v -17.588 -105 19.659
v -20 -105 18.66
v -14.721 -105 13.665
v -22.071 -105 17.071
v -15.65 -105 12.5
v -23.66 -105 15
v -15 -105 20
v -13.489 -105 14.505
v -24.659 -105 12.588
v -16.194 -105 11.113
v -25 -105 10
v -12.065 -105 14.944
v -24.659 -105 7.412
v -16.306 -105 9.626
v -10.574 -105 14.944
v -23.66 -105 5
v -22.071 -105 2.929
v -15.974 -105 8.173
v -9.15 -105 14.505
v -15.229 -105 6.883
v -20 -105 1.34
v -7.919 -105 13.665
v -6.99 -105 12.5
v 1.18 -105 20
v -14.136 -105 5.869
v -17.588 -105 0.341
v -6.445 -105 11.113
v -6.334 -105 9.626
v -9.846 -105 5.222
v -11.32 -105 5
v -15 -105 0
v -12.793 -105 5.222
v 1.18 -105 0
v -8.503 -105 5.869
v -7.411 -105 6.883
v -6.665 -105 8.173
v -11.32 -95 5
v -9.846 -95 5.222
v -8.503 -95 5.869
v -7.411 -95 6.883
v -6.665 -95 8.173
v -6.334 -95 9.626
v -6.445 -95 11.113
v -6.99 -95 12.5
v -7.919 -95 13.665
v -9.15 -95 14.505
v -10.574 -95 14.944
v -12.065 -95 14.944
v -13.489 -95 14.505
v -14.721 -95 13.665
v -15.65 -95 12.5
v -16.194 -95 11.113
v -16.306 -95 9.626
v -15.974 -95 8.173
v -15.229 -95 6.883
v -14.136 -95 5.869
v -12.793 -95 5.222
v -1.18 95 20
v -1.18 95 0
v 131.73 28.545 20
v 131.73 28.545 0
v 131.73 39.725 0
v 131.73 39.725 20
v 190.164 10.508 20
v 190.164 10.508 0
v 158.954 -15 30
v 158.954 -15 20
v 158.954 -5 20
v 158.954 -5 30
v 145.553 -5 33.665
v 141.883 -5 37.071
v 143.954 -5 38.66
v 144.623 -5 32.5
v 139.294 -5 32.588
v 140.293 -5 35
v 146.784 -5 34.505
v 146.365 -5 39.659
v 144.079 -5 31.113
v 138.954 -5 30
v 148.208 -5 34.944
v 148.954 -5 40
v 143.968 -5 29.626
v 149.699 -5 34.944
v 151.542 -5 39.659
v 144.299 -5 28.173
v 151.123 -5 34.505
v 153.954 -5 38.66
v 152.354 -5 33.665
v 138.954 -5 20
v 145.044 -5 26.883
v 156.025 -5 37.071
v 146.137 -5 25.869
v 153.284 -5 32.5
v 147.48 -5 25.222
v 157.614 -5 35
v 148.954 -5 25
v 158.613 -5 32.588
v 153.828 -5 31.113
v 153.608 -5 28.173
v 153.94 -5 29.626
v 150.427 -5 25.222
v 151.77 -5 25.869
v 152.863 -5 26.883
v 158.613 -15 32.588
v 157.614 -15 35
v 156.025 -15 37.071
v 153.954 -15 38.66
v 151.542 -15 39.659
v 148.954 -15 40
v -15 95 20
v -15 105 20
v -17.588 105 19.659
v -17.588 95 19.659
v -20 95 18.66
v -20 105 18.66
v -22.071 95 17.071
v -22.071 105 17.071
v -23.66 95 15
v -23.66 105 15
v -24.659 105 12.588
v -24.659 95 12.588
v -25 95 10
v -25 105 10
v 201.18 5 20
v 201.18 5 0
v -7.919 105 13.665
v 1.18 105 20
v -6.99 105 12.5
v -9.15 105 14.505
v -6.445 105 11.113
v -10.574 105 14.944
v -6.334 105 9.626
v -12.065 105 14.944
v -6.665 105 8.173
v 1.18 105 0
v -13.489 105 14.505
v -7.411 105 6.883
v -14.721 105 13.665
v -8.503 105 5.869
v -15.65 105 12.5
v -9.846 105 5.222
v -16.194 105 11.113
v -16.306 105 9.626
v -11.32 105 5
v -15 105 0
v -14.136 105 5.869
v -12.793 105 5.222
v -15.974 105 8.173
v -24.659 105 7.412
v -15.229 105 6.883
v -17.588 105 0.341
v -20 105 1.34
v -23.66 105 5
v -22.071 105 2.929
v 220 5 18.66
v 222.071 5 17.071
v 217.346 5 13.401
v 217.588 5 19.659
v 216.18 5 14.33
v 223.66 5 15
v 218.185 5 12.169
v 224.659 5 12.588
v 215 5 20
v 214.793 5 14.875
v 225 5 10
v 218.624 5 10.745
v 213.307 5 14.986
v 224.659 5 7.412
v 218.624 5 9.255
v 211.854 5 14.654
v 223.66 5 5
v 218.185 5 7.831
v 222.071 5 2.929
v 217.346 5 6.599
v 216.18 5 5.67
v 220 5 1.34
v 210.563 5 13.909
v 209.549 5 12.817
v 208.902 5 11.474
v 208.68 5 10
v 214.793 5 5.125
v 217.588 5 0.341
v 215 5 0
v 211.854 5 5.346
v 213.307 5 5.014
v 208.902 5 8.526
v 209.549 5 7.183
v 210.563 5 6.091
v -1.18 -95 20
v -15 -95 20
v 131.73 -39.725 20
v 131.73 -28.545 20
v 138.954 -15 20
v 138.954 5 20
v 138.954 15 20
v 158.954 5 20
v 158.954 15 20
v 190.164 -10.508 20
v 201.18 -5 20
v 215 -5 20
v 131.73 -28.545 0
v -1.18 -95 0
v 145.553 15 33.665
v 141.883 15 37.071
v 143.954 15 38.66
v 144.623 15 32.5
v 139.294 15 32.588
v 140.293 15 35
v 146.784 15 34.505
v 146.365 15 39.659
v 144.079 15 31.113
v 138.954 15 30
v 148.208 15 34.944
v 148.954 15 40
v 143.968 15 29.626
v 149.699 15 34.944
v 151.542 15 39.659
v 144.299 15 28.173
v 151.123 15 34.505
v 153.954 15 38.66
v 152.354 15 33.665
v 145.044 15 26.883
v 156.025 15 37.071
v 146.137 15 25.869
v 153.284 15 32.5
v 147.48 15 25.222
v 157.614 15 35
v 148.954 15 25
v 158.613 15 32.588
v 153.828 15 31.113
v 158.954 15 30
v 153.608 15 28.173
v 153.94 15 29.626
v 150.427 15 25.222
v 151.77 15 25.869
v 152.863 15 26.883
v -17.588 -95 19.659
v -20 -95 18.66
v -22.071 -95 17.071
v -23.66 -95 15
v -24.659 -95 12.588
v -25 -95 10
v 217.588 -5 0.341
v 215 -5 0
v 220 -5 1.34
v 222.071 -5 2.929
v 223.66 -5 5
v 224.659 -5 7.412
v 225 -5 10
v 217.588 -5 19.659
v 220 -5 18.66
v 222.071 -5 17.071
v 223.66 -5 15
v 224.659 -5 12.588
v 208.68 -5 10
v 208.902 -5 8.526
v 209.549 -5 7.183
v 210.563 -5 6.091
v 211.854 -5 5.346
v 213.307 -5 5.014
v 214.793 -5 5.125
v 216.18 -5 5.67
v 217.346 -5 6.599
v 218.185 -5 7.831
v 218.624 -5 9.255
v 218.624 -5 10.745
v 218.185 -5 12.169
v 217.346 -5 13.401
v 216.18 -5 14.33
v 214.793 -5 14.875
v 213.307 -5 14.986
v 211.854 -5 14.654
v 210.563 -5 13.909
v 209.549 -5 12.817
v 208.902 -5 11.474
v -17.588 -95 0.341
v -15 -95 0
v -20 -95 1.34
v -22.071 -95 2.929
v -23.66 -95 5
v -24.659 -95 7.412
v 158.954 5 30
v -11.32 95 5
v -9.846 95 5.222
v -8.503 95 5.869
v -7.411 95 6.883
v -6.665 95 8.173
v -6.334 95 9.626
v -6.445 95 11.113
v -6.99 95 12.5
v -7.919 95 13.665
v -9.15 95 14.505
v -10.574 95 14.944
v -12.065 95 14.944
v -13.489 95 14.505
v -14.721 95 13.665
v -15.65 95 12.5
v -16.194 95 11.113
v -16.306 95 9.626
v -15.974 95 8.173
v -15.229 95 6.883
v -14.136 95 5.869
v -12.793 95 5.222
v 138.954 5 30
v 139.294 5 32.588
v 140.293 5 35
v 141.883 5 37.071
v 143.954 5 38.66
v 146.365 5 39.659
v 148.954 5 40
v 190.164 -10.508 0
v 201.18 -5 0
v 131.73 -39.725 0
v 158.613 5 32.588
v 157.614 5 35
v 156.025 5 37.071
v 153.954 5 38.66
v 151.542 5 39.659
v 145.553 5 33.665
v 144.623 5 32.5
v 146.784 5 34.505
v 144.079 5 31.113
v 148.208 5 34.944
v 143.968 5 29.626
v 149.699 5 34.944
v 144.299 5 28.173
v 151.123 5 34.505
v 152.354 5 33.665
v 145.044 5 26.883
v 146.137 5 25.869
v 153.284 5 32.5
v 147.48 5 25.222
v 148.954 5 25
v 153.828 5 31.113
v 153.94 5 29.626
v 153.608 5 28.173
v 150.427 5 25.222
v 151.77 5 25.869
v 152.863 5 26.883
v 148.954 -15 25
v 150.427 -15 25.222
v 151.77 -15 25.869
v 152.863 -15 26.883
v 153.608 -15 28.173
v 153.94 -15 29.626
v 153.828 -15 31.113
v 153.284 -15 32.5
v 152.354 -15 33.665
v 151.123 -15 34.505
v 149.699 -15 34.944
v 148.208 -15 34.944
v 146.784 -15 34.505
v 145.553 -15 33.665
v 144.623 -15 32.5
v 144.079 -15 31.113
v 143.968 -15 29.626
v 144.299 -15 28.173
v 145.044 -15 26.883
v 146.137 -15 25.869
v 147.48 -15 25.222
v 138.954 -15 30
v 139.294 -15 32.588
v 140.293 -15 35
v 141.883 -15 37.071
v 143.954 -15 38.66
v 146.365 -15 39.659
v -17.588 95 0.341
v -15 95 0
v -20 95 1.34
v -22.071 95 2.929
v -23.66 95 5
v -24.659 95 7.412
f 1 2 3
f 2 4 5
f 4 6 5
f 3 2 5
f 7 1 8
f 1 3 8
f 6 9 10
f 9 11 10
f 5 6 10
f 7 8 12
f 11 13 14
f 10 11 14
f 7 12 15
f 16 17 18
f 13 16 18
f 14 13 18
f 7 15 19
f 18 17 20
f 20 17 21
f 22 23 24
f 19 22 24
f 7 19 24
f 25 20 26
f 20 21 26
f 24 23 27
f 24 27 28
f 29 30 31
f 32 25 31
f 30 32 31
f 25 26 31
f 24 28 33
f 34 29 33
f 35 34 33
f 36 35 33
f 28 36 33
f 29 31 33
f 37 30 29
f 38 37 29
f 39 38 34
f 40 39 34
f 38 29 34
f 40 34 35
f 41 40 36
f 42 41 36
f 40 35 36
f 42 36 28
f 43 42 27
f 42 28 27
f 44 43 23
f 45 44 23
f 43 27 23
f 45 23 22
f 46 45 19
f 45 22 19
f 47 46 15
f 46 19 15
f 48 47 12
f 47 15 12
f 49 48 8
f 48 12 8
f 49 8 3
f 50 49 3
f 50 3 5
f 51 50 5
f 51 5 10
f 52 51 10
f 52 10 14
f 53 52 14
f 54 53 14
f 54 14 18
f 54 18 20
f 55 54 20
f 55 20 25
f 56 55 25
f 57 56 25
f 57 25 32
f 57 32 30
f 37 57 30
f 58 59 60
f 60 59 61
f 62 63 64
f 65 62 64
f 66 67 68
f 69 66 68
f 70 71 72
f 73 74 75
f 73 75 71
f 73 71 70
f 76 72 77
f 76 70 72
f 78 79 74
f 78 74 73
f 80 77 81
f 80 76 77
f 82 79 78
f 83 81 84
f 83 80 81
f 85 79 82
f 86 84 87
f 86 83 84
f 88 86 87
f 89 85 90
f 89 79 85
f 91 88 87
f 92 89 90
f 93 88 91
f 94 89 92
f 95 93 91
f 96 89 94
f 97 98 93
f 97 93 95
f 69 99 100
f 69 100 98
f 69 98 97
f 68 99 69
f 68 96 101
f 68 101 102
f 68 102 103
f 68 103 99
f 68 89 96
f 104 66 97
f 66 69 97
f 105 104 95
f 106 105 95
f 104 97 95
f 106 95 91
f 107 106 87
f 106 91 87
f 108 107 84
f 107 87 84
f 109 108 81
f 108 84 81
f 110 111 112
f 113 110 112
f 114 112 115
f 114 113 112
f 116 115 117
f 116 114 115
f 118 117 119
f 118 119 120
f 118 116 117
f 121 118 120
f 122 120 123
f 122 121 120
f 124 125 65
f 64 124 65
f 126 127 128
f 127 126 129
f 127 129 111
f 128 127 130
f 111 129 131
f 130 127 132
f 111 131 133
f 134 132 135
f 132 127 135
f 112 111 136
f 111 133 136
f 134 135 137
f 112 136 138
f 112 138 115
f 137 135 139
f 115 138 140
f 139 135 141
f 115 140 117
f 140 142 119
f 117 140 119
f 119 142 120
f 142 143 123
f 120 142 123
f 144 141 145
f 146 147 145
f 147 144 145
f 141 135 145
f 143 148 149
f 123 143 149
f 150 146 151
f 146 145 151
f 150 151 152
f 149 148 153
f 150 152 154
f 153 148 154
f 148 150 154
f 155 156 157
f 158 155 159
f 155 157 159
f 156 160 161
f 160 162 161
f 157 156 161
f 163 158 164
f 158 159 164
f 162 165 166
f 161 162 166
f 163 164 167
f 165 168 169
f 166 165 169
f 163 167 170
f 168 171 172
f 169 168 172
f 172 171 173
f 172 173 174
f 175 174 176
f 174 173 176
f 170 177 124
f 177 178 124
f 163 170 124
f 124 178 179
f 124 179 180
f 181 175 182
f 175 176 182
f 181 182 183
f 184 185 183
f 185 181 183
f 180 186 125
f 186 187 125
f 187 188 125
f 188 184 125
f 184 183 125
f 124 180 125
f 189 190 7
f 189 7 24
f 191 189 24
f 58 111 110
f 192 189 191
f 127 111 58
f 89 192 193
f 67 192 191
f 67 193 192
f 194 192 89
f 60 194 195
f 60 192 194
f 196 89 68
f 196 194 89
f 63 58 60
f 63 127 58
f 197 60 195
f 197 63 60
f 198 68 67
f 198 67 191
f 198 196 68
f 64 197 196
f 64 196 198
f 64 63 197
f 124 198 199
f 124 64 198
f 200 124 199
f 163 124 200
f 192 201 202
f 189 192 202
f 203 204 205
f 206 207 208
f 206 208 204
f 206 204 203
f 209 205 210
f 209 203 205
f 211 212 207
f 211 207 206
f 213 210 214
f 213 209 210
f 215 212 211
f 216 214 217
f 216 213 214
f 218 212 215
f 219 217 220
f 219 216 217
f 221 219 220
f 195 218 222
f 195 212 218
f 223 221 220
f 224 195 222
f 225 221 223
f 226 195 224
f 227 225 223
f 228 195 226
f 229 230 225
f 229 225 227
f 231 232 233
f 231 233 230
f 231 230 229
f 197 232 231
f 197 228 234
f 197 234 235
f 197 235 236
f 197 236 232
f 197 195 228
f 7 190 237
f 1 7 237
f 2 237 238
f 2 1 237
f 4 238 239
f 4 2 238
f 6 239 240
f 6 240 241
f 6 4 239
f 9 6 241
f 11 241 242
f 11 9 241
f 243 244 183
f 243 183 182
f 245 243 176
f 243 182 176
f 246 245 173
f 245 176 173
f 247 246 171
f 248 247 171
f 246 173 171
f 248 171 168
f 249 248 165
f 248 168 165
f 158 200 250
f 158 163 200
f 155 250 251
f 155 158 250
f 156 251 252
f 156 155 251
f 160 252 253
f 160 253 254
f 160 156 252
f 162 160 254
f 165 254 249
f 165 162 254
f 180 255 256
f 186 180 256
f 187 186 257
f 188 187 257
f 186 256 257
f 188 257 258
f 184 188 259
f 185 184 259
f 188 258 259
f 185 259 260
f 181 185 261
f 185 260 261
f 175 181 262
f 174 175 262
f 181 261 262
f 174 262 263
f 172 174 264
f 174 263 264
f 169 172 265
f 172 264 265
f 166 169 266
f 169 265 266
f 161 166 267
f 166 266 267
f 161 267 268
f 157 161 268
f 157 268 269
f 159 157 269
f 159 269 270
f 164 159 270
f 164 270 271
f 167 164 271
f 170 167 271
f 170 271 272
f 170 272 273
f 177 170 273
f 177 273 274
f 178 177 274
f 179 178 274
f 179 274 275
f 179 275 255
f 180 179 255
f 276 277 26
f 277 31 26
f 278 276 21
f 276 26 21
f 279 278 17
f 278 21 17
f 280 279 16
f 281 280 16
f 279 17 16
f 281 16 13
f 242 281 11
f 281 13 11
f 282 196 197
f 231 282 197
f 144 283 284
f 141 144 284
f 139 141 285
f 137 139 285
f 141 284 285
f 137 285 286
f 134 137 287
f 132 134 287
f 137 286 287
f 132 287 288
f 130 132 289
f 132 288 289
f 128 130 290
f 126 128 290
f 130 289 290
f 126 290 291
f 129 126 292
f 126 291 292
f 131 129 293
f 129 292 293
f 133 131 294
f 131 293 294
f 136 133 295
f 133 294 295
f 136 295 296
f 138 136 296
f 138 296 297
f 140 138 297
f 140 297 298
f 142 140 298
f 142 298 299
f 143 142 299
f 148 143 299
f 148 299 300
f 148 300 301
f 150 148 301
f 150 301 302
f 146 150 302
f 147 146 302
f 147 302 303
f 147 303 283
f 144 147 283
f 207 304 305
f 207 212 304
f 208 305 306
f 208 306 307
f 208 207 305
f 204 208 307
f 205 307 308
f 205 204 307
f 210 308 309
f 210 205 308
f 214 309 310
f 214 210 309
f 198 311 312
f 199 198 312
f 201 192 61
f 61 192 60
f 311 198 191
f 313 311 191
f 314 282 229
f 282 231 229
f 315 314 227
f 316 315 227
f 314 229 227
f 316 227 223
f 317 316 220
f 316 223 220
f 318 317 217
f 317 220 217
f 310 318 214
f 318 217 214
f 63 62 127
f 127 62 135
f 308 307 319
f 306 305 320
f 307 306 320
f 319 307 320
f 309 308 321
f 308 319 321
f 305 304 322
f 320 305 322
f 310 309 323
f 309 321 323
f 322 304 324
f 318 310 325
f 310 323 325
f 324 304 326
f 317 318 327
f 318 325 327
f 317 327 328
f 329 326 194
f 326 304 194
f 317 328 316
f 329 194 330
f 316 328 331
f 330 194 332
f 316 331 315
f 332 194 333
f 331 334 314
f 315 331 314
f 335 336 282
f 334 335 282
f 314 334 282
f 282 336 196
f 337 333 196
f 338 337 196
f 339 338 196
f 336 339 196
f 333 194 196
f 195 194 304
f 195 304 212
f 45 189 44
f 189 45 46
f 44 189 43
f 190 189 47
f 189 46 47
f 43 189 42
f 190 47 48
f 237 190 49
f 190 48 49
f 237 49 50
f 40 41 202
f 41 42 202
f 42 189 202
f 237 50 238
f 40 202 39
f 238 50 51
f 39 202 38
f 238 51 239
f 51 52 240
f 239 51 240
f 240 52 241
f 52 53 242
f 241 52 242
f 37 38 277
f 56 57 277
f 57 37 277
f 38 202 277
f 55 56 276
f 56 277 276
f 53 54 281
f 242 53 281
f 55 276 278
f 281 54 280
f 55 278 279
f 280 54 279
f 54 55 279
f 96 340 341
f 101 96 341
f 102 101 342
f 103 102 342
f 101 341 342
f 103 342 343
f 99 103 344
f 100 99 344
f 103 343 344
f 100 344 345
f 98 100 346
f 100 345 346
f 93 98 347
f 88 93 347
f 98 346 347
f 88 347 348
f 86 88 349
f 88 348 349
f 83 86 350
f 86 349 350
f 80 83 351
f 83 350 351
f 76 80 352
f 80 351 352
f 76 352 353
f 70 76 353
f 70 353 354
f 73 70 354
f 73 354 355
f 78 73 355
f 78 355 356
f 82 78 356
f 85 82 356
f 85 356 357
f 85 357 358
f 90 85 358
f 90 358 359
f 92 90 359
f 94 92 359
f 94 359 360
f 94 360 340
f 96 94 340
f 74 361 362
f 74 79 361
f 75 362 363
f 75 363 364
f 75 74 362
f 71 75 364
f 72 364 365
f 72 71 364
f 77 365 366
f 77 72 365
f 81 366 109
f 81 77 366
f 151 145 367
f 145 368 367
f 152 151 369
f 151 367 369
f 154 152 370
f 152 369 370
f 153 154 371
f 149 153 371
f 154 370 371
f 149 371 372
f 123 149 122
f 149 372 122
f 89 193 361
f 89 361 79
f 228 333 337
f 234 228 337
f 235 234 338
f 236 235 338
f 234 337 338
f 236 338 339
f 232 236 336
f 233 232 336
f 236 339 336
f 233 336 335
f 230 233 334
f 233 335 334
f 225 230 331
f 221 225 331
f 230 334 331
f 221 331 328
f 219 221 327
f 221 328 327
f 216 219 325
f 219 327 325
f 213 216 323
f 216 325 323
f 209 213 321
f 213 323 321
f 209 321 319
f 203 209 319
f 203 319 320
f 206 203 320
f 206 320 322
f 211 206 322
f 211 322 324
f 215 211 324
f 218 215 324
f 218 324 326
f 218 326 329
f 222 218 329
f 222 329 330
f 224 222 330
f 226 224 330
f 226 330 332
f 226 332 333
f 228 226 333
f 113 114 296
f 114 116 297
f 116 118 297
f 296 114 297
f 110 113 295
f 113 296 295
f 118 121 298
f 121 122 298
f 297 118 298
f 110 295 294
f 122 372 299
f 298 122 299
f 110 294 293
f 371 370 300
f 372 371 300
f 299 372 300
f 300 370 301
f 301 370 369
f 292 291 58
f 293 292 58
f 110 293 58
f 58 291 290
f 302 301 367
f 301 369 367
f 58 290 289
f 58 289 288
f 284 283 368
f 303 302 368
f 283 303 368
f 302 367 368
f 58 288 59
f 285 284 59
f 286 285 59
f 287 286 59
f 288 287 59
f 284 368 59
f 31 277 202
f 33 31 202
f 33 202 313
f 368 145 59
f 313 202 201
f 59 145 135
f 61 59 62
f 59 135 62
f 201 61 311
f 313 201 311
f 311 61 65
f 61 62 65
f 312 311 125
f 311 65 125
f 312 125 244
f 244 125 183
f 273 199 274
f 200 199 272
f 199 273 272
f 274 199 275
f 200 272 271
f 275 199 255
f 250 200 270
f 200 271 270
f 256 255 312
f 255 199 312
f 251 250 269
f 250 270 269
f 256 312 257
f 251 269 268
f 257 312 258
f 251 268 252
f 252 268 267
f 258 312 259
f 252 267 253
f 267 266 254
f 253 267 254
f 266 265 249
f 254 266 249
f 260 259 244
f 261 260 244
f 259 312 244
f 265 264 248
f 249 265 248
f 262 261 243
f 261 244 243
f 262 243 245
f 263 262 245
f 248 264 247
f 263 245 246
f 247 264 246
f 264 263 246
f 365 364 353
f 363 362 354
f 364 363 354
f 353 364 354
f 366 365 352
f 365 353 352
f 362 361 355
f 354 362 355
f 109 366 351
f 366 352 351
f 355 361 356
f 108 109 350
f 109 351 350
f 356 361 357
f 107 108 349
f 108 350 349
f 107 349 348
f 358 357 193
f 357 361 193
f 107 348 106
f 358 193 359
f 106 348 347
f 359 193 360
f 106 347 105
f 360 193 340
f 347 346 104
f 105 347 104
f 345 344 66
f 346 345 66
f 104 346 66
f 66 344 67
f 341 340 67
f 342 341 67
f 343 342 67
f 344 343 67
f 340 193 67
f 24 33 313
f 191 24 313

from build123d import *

# Parameters (mm, degrees)
EXTRUDE_THIN4_DEPTH = 20
SKETCH2_R           = 5
CUT_EXTRUDE1_DEPTH  = 235
BOSS_EXTRUDE1_DEPTH = 20
SKETCH4_W           = 20
SKETCH4_H           = 10
BOSS_EXTRUDE2_DEPTH = 20
SKETCH5_R           = 5
CUT_EXTRUDE2_DEPTH  = 160
FILLET1_R           = 10


# Read off the part's stored shape, not the designer's step: Extrude-Thin4
with BuildPart() as part:
    # Extrude-Thin4 outline → Extrude-Thin4 (new body)
    with BuildSketch(Plane.XY):
        Polygon((201.180339887, 5), (1.180339887, 105), (-25, 105), (-25, 95), (-1.180339887, 95), (188.819660113, 0), (-1.180339887, -95), (-25, -95), (-25, -105), (1.180339887, -105), (201.180339887, -5), (225, -5), (225, 5), align=None)
    extrude(amount=EXTRUDE_THIN4_DEPTH)

    # Sketch2 → Cut-Extrude1 (cut)
    with BuildSketch(Plane.XZ.offset(105)):
        with Locations(Location((-11.319660113, 10, 0), (0, 0, 270))):
            Circle(SKETCH2_R)
        with Locations(Location((213.680339887, 10, 0), (0, 0, 180))):
            Circle(SKETCH2_R)
    extrude(amount=-CUT_EXTRUDE1_DEPTH, mode=Mode.SUBTRACT)

    # Sketch3 → Boss-Extrude1 (add)
    with BuildSketch(Plane.XY.offset(20)):
        Polygon((131.729669907, -39.72533499), (131.729669907, 39.72533499), (190.16352069, 10.508409599), (190.16352069, -10.508409599), align=None)
    extrude(amount=-BOSS_EXTRUDE1_DEPTH)

    # Sketch4 → Boss-Extrude2 (add)
    with BuildSketch(Plane.XY.offset(20)):
        with Locations((148.953623882, -10)):
            Rectangle(SKETCH4_W, SKETCH4_H)
        with Locations((148.953623882, 10)):
            Rectangle(SKETCH4_W, SKETCH4_H)
    extrude(amount=BOSS_EXTRUDE2_DEPTH)

    # Sketch5 → Cut-Extrude2 (cut)
    with BuildSketch(Plane.XZ.offset(15)):
        with Locations(Location((148.953623882, 30, 0), (0, 0, 270))):
            Circle(SKETCH5_R)
    extrude(amount=-CUT_EXTRUDE2_DEPTH, mode=Mode.SUBTRACT)

    # Fillet1
    fillet1_edges = [part.edges().sort_by_distance(p)[0] for p in [
        (225, 0, 0),
        (225, 0, 20),
        (-25, 100, 0),
        (-25, 100, 20),
        (-25, -100, 0),
        (-25, -100, 20),
        (138.953623882, 10, 40),
        (158.953623882, 10, 40),
        (158.953623882, -10, 40),
        (138.953623882, -10, 40),
    ]]
    fillet(fillet1_edges, radius=FILLET1_R - 0.0001)  # a hair under: the kernel refuses the full size


solid = part.part
